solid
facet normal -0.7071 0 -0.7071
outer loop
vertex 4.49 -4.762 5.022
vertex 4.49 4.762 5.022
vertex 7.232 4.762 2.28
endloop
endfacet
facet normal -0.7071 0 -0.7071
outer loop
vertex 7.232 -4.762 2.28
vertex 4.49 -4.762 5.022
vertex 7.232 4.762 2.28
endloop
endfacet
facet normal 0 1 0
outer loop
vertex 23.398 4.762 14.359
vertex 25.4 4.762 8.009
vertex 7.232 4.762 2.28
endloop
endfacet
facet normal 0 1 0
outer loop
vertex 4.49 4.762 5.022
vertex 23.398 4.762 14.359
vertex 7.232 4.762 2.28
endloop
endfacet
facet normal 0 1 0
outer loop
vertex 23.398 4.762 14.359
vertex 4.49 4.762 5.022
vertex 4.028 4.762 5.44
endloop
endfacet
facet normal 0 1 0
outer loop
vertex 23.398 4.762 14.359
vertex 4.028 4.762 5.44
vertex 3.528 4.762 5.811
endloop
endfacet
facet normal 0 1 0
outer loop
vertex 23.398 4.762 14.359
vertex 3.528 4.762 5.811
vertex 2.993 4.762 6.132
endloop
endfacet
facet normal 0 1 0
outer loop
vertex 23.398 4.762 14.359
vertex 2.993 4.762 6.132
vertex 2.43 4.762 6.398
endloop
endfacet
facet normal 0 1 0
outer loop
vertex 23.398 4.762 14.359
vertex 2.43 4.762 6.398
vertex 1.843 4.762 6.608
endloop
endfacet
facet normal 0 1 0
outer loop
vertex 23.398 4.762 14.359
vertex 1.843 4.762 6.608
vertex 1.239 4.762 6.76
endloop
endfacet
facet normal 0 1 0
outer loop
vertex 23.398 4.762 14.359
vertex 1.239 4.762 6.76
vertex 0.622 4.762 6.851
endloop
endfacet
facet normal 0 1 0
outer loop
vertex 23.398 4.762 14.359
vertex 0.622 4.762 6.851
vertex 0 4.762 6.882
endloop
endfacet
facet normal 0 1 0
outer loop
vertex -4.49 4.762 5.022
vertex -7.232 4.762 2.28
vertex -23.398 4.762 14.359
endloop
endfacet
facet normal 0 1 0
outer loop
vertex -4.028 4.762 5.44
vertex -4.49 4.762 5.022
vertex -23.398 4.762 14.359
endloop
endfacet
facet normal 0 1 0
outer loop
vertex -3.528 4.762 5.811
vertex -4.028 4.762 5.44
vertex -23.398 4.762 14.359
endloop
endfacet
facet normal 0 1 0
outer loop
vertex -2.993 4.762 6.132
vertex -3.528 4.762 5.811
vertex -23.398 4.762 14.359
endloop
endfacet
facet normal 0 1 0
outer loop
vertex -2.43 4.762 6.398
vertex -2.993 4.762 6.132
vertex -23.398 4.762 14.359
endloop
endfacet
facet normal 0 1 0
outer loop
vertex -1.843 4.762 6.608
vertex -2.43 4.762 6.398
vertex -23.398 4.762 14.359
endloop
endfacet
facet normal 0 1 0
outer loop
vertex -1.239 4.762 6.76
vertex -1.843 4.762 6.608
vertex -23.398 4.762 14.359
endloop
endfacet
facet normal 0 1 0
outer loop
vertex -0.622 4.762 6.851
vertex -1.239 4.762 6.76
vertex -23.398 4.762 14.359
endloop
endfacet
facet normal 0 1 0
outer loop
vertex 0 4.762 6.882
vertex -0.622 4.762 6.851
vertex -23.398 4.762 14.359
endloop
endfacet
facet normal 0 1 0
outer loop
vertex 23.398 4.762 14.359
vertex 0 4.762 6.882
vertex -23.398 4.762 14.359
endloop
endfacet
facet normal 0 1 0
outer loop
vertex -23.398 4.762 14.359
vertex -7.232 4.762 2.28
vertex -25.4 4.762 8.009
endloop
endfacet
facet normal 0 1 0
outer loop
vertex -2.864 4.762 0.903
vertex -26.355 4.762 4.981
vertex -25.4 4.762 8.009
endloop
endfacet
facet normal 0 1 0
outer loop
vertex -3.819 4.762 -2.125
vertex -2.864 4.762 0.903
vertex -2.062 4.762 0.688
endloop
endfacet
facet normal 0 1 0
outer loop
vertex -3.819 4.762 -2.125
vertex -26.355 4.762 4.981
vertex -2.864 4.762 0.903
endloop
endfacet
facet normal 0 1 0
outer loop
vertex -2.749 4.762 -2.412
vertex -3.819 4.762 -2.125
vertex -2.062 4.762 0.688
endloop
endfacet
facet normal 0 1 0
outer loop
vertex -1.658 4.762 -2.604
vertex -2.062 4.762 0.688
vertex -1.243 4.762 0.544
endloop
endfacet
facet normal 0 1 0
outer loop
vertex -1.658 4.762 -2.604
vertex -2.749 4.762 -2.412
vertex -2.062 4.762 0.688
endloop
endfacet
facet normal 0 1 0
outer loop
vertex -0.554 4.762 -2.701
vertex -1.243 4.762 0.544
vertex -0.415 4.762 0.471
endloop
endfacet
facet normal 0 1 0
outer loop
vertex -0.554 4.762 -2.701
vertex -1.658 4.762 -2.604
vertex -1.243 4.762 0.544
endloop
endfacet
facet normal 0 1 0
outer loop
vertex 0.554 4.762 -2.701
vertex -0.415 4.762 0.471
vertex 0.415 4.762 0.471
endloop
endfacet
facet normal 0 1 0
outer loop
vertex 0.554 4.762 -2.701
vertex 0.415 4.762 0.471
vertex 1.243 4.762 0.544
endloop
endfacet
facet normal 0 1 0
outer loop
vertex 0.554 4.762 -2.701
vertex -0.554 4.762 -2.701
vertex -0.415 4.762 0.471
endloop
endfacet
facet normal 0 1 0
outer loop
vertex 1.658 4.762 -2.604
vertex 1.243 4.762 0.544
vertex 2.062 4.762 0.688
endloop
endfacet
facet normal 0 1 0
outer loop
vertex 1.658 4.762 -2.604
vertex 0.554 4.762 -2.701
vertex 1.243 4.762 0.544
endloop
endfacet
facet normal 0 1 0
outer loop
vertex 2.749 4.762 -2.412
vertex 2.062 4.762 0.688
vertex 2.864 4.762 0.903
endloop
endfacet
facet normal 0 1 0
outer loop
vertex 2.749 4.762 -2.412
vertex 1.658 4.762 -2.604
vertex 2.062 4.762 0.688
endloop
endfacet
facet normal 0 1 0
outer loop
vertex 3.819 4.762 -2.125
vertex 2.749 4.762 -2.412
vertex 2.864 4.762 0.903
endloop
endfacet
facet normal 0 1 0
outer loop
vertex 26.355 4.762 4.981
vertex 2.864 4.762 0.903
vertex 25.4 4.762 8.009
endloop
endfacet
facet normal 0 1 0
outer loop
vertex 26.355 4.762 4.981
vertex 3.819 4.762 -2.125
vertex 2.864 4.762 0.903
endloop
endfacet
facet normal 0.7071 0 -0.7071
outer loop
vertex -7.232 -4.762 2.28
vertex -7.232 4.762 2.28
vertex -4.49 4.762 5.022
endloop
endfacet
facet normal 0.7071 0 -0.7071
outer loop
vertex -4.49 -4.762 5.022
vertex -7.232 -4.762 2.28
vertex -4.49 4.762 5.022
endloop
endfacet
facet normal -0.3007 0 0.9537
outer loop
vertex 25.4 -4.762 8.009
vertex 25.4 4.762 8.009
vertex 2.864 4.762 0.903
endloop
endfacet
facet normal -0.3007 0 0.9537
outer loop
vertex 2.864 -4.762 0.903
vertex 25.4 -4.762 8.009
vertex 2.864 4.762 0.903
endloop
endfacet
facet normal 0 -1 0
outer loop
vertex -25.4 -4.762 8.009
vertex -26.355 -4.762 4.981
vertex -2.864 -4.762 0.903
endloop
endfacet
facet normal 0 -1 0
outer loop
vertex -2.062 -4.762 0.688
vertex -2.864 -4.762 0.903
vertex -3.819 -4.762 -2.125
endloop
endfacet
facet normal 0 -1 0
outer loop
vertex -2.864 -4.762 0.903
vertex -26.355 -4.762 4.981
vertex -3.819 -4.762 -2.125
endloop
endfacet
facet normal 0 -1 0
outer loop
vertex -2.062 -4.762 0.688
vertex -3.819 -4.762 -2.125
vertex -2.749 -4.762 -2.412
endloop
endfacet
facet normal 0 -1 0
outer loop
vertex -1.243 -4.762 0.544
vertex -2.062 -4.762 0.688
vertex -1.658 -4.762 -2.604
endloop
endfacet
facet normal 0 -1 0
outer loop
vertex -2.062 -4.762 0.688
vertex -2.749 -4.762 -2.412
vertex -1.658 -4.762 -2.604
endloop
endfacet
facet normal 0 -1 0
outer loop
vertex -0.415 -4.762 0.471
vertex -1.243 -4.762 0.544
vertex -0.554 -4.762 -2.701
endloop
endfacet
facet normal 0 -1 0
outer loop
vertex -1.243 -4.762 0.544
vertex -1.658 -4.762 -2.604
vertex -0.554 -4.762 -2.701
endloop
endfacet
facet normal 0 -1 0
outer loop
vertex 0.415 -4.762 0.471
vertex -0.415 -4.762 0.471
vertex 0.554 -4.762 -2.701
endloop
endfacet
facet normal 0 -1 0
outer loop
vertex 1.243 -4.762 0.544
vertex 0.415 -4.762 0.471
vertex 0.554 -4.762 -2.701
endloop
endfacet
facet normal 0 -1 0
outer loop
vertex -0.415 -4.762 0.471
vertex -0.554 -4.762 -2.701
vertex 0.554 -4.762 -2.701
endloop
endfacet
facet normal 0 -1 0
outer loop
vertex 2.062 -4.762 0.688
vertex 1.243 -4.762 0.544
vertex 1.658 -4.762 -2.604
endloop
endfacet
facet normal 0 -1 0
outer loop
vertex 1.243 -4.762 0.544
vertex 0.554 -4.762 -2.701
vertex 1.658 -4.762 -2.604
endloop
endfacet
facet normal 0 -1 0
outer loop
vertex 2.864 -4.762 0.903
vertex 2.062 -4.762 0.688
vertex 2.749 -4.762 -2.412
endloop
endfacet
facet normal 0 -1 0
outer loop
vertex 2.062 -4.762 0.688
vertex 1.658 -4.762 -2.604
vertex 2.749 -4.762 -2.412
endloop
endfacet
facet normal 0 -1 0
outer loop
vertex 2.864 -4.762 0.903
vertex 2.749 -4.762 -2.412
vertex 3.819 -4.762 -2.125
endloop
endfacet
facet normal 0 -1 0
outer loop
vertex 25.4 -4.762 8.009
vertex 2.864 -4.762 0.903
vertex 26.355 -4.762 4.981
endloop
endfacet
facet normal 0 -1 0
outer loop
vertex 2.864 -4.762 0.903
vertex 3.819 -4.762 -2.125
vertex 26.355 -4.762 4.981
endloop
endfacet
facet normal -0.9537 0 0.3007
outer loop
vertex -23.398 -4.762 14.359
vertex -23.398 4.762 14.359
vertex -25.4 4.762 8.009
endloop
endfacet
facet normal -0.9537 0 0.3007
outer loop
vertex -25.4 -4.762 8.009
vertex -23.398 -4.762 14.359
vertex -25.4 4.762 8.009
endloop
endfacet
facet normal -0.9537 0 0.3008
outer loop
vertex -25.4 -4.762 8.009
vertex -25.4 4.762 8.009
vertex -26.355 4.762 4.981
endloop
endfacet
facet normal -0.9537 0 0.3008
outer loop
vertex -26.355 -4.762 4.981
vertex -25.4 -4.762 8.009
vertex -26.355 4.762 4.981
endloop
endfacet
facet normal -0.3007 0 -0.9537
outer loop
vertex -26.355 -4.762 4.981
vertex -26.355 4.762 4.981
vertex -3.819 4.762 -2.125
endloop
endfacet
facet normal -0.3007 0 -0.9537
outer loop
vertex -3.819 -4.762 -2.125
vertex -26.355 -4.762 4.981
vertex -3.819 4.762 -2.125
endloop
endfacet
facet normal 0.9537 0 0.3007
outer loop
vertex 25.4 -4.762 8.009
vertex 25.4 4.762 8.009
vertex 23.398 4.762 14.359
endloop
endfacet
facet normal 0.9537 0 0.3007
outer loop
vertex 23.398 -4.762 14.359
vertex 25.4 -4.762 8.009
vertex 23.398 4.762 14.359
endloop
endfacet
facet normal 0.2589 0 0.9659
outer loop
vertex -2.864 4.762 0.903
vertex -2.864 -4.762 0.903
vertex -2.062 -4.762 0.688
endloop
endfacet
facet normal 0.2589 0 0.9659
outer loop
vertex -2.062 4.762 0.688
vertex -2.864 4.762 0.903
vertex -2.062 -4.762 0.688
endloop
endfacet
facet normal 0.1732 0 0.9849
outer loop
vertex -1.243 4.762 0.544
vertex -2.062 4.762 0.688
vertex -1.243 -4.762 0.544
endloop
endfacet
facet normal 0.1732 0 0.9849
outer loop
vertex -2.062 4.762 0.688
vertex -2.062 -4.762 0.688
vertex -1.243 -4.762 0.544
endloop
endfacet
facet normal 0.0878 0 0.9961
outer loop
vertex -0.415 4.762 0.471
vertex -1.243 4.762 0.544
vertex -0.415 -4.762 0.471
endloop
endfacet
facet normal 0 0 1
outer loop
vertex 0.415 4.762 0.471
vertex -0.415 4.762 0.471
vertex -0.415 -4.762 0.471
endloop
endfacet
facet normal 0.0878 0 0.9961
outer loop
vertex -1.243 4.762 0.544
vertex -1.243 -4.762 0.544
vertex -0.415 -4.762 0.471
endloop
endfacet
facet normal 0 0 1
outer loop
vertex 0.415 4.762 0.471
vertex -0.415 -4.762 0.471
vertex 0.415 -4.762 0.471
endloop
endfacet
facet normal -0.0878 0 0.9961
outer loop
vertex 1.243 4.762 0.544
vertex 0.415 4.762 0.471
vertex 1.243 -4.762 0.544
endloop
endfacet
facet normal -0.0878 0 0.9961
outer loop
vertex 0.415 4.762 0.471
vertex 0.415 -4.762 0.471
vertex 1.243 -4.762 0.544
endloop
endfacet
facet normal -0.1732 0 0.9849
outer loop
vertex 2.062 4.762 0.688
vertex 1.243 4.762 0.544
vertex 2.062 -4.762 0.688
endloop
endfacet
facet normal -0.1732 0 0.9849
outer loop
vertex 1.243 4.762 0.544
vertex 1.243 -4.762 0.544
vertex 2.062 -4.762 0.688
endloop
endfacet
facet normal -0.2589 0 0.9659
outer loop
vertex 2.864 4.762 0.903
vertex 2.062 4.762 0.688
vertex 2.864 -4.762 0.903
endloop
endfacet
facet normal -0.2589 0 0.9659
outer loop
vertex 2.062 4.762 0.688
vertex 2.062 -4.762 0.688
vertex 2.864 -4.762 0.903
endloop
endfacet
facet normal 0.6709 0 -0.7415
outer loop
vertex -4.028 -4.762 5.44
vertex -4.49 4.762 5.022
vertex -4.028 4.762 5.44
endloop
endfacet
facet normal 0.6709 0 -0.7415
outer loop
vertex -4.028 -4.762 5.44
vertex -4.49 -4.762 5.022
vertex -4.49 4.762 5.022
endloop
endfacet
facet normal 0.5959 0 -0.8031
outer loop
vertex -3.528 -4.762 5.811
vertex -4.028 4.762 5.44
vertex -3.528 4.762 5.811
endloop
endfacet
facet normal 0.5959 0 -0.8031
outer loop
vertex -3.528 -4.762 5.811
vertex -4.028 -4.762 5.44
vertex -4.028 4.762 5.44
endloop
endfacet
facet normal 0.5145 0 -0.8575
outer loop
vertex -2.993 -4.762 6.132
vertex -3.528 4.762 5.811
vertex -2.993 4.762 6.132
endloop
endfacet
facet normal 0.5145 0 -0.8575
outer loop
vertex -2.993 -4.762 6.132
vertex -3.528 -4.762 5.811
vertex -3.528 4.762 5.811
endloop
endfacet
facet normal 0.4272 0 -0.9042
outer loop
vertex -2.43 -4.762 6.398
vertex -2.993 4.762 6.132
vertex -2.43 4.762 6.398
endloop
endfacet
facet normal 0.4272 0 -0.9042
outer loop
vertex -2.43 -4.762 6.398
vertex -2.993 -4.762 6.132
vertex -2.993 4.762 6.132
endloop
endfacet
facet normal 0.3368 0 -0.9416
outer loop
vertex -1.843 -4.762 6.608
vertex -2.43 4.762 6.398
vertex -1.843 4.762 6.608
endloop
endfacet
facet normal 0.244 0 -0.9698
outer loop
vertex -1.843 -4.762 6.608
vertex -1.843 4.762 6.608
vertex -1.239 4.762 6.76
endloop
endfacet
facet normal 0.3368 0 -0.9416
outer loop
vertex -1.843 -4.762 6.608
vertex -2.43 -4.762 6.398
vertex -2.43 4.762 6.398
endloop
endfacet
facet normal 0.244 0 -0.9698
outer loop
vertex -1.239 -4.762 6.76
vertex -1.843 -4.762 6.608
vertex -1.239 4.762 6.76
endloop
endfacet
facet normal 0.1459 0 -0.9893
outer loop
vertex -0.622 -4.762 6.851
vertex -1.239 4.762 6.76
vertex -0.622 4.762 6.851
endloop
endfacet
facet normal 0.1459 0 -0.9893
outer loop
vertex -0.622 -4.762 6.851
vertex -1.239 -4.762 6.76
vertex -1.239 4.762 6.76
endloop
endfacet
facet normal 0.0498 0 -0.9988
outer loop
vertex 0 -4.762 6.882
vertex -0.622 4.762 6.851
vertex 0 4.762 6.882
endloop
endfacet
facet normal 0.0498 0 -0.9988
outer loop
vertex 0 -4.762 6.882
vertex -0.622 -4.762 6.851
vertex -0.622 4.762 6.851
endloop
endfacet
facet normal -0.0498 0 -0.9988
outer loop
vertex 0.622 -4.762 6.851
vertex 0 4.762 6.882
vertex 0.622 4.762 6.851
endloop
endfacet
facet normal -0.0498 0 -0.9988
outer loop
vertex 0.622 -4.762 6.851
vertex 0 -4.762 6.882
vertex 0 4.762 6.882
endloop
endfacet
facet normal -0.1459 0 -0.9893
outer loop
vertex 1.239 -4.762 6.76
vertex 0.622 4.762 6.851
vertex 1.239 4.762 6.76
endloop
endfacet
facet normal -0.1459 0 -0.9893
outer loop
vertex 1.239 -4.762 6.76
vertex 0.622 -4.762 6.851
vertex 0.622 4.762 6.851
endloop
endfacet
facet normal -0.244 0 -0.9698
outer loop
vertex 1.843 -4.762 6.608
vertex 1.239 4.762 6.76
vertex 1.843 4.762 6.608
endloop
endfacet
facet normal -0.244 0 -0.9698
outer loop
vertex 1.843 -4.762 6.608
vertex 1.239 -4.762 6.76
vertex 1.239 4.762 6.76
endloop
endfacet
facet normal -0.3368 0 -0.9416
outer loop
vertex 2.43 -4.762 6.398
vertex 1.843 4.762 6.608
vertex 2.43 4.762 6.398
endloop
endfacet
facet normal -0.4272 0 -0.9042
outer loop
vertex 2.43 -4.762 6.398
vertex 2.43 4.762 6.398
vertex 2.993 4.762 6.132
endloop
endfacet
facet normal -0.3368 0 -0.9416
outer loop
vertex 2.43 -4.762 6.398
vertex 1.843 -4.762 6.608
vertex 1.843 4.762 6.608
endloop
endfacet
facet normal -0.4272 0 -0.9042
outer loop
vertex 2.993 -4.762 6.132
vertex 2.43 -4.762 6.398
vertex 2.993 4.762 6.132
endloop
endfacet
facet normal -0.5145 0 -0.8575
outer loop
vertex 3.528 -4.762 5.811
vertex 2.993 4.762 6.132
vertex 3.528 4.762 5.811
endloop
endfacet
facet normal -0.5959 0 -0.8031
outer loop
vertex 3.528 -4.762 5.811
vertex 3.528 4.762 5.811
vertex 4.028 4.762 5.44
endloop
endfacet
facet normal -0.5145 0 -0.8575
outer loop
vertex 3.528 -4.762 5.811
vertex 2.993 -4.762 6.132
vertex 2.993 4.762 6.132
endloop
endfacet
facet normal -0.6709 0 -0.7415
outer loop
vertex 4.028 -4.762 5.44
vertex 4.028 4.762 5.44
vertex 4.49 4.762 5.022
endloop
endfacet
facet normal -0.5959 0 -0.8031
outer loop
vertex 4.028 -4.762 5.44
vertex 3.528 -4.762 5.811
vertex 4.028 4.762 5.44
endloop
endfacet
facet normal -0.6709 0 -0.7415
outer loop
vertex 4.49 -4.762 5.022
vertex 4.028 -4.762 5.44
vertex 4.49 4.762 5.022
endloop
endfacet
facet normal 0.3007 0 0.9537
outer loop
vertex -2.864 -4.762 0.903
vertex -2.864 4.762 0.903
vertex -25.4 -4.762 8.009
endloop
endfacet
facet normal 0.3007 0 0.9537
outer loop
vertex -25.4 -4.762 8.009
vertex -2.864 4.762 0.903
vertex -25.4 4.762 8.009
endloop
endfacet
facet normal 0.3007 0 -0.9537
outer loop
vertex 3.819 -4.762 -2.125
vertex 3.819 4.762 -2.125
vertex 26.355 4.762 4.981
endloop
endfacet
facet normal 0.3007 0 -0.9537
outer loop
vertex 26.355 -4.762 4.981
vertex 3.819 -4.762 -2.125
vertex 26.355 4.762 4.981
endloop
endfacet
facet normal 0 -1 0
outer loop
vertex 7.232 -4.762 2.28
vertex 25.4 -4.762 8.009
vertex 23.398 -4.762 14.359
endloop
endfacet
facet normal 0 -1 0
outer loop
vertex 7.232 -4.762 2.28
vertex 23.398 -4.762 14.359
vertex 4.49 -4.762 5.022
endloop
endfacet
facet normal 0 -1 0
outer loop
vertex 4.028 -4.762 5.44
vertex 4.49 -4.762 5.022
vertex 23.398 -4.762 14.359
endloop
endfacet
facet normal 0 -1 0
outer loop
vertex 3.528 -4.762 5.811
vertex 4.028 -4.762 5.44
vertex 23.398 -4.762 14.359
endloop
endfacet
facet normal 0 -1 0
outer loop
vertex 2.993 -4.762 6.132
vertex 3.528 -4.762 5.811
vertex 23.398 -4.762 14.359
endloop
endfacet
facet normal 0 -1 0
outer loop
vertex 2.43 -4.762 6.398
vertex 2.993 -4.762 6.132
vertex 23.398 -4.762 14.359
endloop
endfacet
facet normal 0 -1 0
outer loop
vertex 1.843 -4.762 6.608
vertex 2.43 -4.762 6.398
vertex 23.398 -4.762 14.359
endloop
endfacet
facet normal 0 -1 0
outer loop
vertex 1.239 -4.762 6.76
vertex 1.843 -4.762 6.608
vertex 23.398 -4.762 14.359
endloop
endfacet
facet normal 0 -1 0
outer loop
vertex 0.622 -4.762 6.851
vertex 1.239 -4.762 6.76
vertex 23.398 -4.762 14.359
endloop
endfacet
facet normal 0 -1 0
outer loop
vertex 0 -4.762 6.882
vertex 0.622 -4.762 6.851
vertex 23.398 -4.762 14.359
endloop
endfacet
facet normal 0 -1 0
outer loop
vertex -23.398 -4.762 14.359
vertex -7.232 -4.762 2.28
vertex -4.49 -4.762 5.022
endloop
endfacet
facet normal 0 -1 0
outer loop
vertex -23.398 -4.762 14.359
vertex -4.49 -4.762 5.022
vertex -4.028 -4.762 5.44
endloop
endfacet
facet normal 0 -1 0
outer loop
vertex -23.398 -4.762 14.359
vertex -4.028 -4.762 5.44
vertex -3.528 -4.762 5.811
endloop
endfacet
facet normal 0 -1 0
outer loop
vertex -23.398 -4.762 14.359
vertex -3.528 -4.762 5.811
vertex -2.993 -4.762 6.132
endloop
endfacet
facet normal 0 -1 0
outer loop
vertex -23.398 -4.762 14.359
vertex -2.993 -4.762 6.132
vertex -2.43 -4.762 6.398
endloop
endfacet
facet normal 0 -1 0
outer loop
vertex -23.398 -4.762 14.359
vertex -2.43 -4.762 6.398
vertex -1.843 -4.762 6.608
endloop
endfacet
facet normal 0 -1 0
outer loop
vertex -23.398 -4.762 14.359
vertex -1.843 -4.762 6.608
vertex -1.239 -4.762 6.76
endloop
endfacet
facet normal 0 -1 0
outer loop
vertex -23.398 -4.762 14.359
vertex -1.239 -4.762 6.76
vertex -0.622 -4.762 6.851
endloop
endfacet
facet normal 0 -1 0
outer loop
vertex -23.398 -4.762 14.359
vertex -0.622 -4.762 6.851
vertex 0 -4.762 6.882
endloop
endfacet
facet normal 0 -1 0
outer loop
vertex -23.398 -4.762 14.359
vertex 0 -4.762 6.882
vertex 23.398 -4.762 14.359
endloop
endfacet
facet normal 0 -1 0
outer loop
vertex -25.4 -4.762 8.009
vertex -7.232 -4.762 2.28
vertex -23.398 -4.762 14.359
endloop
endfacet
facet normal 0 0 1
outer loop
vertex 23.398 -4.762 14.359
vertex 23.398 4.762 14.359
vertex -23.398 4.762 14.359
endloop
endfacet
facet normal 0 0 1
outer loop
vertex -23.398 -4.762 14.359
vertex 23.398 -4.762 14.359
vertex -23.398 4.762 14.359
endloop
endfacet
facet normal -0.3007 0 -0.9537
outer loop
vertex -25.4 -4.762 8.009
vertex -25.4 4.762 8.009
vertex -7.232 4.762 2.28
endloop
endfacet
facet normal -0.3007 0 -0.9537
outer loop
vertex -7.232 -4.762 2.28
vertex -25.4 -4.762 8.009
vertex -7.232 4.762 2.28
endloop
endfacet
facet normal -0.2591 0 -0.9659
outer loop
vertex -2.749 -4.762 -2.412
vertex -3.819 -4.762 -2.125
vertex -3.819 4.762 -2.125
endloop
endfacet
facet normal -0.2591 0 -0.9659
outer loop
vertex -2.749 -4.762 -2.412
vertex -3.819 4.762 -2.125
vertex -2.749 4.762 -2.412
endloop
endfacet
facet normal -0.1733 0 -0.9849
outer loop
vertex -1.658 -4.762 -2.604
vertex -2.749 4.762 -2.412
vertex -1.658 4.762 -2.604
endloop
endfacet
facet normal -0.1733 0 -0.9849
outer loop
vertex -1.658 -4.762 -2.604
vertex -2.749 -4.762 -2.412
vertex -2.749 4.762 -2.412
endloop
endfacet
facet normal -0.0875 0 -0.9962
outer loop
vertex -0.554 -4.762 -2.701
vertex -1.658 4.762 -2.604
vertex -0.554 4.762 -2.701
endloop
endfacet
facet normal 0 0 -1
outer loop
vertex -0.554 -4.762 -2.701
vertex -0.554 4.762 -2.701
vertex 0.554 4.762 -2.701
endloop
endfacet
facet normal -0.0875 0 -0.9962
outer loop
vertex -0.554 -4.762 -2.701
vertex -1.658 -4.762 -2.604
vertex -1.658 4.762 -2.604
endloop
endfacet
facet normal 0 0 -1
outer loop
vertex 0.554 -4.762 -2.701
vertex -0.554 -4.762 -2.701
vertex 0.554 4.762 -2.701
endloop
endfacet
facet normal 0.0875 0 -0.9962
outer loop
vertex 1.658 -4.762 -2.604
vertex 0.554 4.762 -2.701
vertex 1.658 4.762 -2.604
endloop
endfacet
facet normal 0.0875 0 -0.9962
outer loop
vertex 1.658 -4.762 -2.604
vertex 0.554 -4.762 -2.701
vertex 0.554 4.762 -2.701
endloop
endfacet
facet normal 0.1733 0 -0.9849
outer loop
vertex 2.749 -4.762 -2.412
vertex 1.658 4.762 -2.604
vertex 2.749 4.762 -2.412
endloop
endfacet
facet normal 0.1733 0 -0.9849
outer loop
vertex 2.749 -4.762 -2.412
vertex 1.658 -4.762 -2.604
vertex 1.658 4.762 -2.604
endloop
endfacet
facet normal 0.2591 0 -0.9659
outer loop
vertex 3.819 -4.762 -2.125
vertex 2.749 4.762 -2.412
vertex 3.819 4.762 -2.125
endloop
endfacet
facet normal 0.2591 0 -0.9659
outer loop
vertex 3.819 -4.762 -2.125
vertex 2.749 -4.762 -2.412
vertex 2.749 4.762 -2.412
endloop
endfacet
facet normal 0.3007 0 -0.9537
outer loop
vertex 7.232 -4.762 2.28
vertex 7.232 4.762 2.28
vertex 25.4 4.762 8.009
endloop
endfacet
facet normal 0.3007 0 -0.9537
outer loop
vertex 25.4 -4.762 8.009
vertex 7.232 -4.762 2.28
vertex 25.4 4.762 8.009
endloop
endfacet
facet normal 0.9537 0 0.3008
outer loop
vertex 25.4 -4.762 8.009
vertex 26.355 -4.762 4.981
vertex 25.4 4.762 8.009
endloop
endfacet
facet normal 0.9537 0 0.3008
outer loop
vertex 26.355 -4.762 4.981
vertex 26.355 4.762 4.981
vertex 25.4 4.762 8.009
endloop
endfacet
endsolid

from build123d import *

# Parameters (mm, degrees)
BOSS_EXTRUDE1_DEPTH    = 4.7625
BOSS_EXTRUDE2_DEPTH    = 9.525
FILLET1_R              = 6.35
CONVERT_SOLID1_START   = -4.7625
CONVERT_SOLID1_DEPTH   = 9.525
CONVERT_SOLID1_2_DEPTH = 9.525


# Read off the part's stored shape, not the designer's step: Convert-Solid1
with BuildPart() as part:
    # Sketch1 → Boss-Extrude1 (new, symmetric)
    with BuildSketch(Plane(origin=(0, 0, 0), x_dir=(1, 0, 0), z_dir=(0, 1, 0))):
        Polygon((0, 3.329079972), (26.354740913, -4.980537919), (25.4, -8.008589238), (0, 0), (-25.4, -8.008589238), (-26.354740913, -4.980537919), align=None)
    extrude(amount=BOSS_EXTRUDE1_DEPTH, both=True)

    # Convert-Solid1 outline → Convert-Solid1 (cut)
    with BuildSketch(Plane(origin=(0, 0, 0), x_dir=(1, 0, 0), z_dir=(0, 1, 0)).offset(CONVERT_SOLID1_START)):
        with BuildLine():
            ThreePointArc((-3.818963654, 2.124965358), (0, 2.712760083), (3.818963654, 2.124965358))
            Line((3.818963654, 2.124965358), (0, 3.329079972))
            Line((0, 3.329079972), (-3.818963654, 2.124965358))
        make_face()
    extrude(amount=CONVERT_SOLID1_DEPTH, mode=Mode.SUBTRACT)

    # Convert-Solid1 2 outline → Convert-Solid1 2 (add)
    with BuildSketch(Plane(origin=(0, 0, 0), x_dir=(1, 0, 0), z_dir=(0, 1, 0)).offset(CONVERT_SOLID1_START)):
        with BuildLine():
            ThreePointArc((-2.86422274, -0.903085961), (0, -0.462239917), (2.86422274, -0.903085961))
            Line((2.86422274, -0.903085961), (0, 0))
            Line((0, 0), (-2.86422274, -0.903085961))
        make_face()
    extrude(amount=CONVERT_SOLID1_2_DEPTH)


with BuildPart() as body_2:
    # Sketch3 → Boss-Extrude2 (new body)
    with BuildSketch(Plane(origin=(0, 4.7625, 0), x_dir=(1, 0, 0), z_dir=(0, 1, 0))):
        Polygon((-25.4, -8.008589238), (-7.231692088, -2.280143757), (0, -9.511835845), (7.231692088, -2.280143757), (25.4, -8.008589238), (23.397852691, -14.358589238), (-23.397852691, -14.358589238), align=None)
    extrude(amount=-BOSS_EXTRUDE2_DEPTH)

    # Fillet1
    fillet1_edges = [body_2.edges().sort_by_distance(p)[0] for p in [
        (0, 0, 9.511835845),
    ]]
    fillet(fillet1_edges, radius=FILLET1_R)


solid = Compound([part.part, body_2.part])
